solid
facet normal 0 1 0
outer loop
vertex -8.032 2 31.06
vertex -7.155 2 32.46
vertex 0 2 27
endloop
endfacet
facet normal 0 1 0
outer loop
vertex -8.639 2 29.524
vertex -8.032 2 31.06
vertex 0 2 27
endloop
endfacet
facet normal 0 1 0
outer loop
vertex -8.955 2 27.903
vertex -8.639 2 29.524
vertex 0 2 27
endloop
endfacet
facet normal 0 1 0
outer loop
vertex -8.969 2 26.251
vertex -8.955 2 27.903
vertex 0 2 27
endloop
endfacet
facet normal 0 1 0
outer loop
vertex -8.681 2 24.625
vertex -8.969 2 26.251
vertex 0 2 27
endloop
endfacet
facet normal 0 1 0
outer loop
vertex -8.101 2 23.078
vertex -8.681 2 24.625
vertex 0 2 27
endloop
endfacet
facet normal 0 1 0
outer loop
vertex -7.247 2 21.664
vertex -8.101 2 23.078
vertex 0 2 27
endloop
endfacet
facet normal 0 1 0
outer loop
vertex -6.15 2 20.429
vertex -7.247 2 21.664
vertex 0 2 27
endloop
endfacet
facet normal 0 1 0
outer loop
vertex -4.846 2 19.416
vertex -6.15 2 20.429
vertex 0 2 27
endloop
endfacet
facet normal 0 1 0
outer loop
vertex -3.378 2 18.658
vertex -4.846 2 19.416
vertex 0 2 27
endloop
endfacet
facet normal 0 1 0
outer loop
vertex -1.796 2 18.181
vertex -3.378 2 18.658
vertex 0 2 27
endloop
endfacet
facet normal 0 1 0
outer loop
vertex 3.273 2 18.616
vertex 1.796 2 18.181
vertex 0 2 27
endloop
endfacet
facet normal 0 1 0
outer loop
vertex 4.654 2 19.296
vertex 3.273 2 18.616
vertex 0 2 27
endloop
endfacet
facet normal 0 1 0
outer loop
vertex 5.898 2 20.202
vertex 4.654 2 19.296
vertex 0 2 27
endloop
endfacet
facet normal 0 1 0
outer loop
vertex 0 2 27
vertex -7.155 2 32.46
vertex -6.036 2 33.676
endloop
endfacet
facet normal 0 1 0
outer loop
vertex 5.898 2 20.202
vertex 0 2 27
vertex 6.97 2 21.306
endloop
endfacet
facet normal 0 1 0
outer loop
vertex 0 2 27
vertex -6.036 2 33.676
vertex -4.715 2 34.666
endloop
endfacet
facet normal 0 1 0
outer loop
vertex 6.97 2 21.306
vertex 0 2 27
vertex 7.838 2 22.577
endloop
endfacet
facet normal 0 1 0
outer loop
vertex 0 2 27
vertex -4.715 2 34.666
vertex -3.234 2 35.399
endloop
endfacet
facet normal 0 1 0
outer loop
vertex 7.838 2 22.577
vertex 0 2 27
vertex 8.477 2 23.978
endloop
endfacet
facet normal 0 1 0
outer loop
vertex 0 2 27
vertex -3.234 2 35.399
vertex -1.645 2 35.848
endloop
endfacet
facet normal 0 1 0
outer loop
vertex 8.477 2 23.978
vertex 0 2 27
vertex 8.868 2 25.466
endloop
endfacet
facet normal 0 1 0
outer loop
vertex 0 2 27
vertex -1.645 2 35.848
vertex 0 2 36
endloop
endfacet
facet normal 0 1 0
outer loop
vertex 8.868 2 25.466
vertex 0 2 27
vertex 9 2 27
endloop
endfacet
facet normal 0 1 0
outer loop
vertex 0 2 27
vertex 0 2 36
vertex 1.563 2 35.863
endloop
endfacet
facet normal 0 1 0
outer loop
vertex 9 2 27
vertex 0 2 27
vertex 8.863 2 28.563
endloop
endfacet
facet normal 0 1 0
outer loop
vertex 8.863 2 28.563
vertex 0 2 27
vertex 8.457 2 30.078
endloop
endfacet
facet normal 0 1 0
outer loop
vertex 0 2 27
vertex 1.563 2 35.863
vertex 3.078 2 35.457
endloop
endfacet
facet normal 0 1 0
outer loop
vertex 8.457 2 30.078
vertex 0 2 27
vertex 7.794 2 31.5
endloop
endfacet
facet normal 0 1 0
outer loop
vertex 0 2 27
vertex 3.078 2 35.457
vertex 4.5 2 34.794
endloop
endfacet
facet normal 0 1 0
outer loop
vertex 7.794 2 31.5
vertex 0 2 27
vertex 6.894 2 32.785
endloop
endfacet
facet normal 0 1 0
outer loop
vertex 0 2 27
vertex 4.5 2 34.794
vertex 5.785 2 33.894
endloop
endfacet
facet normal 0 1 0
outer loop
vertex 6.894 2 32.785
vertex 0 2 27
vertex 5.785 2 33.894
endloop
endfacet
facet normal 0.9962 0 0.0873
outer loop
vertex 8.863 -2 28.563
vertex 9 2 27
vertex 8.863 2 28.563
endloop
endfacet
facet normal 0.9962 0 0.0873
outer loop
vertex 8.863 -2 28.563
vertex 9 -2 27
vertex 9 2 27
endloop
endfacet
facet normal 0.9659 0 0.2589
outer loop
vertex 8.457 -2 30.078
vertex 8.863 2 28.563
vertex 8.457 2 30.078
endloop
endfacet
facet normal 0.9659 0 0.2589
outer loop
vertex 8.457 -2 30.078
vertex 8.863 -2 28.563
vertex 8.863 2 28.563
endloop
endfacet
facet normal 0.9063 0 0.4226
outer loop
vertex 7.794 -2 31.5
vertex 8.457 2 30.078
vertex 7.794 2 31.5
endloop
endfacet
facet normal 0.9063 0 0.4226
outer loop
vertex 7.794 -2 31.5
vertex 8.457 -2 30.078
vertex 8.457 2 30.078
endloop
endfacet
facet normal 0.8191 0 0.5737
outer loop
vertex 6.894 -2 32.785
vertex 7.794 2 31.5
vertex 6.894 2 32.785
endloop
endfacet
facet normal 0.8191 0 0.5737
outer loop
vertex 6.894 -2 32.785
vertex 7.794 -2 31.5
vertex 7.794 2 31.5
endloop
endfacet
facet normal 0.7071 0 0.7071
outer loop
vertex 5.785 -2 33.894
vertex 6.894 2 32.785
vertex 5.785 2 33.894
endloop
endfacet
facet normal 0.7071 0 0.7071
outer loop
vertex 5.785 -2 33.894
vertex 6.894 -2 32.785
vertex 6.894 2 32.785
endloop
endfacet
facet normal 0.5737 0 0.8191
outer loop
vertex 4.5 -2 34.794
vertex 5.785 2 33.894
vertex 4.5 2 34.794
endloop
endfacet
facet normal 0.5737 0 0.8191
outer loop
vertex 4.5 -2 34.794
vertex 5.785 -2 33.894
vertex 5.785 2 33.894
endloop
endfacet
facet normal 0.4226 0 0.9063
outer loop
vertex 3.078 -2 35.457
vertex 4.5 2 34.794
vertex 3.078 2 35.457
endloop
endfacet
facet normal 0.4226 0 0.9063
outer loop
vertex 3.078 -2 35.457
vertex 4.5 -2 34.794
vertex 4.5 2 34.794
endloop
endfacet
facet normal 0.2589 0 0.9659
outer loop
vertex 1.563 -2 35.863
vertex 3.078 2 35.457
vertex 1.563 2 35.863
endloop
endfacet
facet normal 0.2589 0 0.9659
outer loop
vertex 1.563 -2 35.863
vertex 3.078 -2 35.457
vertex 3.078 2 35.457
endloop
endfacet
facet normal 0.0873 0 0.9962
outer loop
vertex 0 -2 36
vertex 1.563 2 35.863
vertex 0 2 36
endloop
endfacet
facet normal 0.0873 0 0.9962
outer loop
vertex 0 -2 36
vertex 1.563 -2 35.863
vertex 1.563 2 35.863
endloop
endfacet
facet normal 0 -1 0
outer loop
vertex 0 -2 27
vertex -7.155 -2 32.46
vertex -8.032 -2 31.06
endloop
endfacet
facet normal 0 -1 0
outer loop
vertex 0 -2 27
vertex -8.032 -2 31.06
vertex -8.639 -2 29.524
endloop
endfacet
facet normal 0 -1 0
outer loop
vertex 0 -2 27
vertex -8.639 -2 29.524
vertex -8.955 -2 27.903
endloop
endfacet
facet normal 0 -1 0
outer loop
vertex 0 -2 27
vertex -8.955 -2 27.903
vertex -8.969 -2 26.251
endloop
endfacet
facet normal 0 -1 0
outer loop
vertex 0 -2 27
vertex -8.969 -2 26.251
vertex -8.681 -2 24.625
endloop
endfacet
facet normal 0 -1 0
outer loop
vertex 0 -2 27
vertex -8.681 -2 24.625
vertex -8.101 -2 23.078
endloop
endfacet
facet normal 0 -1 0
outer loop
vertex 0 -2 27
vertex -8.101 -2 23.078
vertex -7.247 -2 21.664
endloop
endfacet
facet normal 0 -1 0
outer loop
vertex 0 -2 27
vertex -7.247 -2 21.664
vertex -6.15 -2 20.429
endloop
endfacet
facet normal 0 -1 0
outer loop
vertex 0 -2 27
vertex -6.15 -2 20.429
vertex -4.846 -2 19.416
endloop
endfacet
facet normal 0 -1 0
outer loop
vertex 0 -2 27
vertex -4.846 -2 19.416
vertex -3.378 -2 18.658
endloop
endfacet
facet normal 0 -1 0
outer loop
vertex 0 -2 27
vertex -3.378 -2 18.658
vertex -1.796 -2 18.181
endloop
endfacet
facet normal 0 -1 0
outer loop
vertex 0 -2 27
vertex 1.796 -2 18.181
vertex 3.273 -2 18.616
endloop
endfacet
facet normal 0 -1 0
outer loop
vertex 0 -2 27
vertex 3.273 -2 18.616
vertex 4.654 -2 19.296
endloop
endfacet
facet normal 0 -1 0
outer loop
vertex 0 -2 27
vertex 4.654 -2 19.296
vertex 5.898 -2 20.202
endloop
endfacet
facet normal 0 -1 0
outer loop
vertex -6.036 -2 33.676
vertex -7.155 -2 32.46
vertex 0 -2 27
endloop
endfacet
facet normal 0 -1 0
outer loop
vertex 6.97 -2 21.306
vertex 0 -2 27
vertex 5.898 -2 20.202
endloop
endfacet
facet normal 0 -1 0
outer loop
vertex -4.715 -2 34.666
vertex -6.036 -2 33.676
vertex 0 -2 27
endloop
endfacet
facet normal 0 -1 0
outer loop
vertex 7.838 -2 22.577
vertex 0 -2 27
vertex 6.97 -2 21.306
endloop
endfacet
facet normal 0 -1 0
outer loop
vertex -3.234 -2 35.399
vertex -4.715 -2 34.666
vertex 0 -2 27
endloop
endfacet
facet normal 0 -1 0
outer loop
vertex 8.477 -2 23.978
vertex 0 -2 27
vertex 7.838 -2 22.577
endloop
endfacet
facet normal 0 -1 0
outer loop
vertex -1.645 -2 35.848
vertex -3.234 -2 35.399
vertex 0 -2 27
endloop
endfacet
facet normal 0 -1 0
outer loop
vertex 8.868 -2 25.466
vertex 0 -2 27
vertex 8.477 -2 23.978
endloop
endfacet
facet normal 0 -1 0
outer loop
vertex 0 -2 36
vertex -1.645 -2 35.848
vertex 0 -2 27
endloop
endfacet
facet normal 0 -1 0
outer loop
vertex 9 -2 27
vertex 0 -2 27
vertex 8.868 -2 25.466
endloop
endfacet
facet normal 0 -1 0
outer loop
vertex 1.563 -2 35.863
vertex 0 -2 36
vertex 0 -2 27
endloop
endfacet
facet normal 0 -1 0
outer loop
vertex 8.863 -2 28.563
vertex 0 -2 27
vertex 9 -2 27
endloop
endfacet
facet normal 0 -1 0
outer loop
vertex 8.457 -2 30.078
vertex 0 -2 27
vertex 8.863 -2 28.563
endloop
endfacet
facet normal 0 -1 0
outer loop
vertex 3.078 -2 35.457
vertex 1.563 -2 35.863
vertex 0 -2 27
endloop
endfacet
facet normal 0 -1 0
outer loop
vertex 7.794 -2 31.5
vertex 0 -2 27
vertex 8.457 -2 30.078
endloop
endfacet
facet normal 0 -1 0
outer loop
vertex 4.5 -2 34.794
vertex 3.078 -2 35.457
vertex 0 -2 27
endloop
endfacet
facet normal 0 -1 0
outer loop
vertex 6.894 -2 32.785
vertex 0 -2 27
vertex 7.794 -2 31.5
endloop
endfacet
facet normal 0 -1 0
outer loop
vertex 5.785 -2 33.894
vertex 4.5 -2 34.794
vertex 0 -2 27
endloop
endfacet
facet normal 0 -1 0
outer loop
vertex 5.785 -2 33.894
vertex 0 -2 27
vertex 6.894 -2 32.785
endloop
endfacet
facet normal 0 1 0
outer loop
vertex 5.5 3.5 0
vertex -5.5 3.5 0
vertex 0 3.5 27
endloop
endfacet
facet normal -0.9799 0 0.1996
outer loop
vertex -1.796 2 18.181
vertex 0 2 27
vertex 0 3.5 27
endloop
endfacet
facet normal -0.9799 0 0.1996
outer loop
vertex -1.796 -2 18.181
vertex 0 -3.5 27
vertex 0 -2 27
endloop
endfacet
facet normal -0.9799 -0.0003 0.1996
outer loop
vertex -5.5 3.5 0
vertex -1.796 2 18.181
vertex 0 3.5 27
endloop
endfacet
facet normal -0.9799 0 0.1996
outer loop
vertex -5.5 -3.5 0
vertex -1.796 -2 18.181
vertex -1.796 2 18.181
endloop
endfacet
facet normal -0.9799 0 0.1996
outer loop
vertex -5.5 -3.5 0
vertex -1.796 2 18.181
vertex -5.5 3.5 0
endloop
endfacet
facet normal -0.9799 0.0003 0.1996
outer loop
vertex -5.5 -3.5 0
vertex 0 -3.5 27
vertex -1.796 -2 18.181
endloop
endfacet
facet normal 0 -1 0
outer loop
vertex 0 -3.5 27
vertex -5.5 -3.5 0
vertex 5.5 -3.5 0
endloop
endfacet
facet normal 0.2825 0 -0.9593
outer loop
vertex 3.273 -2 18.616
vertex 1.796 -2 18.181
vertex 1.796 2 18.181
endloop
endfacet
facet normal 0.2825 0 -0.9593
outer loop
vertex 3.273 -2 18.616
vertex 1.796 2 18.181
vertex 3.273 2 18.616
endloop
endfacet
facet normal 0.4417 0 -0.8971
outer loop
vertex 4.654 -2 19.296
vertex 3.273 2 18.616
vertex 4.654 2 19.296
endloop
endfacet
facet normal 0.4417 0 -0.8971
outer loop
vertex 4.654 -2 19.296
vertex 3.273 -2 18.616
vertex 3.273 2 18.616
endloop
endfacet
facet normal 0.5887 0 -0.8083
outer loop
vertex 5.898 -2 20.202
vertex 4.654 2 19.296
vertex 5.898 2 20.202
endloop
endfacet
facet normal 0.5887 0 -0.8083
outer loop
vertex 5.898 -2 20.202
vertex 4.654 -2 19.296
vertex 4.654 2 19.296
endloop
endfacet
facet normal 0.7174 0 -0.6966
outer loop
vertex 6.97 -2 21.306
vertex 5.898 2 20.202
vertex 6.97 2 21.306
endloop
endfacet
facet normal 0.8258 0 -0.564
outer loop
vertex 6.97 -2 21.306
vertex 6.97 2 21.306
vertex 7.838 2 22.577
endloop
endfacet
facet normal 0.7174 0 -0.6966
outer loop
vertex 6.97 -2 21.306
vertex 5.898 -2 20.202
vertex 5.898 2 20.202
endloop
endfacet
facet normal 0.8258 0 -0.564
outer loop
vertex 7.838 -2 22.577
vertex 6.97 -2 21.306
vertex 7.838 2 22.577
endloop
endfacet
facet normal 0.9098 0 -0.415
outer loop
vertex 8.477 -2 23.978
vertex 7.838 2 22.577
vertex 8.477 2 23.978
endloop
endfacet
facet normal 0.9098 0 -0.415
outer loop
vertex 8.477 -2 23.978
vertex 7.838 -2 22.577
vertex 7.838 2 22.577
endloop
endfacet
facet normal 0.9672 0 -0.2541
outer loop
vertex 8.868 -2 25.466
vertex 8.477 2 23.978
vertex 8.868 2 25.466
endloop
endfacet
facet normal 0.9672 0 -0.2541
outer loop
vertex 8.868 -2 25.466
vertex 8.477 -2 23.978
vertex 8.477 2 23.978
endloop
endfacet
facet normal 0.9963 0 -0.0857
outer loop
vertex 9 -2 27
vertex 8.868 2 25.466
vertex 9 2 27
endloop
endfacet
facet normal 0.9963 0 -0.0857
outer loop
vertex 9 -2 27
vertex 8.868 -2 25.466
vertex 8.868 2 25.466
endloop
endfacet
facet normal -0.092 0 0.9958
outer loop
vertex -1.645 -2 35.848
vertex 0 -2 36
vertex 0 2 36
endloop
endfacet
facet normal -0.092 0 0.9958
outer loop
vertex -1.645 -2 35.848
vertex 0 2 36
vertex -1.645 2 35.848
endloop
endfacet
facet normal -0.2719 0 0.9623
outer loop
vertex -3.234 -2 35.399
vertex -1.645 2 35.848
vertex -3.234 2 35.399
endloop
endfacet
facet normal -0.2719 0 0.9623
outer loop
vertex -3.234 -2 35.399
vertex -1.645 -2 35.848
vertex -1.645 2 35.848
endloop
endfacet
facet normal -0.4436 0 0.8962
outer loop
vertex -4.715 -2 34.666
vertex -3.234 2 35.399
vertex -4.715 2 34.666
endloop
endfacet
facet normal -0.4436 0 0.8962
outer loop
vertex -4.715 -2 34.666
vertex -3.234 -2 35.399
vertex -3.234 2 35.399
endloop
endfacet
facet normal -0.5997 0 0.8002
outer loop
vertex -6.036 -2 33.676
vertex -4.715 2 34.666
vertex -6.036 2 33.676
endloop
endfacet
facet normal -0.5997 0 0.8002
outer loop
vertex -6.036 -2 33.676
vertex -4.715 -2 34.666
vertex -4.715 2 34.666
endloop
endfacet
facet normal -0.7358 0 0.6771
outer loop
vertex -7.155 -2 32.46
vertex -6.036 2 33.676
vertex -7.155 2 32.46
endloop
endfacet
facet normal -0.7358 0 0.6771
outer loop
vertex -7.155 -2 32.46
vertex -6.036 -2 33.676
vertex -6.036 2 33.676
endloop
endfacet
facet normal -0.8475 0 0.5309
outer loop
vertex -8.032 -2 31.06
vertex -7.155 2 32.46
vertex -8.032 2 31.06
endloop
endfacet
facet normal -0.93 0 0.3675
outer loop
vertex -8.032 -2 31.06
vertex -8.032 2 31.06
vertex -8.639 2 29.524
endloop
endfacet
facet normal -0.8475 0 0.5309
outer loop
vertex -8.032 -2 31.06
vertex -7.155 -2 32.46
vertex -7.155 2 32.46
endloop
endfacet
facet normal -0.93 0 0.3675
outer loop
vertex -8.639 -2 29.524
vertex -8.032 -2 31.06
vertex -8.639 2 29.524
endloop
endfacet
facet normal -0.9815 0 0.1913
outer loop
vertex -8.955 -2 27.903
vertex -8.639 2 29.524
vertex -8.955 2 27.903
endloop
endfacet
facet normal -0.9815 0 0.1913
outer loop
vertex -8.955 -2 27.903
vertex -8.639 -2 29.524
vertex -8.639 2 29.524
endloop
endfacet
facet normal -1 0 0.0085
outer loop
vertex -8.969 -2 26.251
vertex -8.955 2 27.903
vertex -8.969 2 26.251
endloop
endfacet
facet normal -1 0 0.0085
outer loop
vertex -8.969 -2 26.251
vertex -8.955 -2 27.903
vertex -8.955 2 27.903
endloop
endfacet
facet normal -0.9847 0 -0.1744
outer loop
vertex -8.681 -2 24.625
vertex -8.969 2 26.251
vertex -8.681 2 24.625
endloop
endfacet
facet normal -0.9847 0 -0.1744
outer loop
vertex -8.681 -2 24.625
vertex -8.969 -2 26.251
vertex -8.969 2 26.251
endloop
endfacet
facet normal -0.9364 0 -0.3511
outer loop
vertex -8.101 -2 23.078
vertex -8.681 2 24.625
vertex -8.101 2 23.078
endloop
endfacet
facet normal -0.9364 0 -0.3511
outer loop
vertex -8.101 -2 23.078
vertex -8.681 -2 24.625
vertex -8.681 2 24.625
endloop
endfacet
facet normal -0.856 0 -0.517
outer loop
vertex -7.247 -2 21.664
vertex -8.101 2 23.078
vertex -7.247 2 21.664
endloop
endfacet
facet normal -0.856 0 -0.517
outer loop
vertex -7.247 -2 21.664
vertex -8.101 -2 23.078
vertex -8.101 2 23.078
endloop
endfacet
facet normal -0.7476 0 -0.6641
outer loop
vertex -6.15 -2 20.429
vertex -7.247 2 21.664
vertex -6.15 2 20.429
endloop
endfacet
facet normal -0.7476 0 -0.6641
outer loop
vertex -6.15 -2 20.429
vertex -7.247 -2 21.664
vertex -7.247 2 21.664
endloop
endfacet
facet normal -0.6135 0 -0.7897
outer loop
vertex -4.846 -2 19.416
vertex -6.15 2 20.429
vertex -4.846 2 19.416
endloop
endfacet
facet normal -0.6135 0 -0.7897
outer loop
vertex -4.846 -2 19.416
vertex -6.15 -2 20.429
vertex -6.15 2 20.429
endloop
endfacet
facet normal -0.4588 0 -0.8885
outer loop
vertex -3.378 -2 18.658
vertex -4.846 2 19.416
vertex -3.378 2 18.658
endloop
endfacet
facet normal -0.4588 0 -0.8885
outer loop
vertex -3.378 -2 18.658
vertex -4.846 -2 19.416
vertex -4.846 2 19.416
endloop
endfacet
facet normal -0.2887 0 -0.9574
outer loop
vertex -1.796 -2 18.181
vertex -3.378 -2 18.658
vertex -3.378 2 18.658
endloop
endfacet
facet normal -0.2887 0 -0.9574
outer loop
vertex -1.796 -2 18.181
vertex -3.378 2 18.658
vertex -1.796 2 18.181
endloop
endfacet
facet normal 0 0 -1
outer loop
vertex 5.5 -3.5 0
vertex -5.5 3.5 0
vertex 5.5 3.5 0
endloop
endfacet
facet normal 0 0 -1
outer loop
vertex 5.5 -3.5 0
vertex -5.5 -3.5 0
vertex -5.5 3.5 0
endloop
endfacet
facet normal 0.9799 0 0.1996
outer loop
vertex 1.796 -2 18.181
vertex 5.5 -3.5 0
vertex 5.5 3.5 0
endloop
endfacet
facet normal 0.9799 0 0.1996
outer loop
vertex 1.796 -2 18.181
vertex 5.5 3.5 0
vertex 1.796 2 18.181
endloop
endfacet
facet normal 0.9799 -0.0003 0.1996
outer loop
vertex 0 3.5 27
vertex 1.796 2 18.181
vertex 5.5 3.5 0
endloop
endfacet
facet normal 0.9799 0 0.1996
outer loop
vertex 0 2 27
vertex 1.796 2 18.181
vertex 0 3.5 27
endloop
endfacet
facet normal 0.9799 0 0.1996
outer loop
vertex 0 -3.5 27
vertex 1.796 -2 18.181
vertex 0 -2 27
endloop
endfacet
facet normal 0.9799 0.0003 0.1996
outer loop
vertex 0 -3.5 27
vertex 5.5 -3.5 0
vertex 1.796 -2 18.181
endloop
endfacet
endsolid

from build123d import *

# Parameters (mm, degrees)
F1_DEPTH = 2
F3_DEPTH = 3.5


with BuildPart() as f1:
    # F0 (on Front) → F1 (new body, symmetric)
    with BuildSketch(Plane.XZ):
        with BuildLine():
            Line((0, 18), (0, 36))
            ThreePointArc((0, 36), (-9, 27), (0, 18))
        make_face()
        with BuildLine():
            ThreePointArc((0, 18), (6.363961, 20.636039), (9, 27))
            ThreePointArc((9, 27), (6.363961, 33.363961), (0, 36))
            Line((0, 36), (0, 18))
        make_face()
    extrude(amount=F1_DEPTH, both=True)

    # F2 (on Front) → F3 (join, symmetric)
    with BuildSketch(Plane.XZ):
        Polygon((5.5, 0), (0, 27), (-5.5, 0), align=None)
    extrude(amount=F3_DEPTH, both=True)

    # F4: F1 across plane


with BuildPart() as f1_1:
    add(f1.part)
    add(f1.part.mirror(Plane.XZ))


solid = f1_1.part
